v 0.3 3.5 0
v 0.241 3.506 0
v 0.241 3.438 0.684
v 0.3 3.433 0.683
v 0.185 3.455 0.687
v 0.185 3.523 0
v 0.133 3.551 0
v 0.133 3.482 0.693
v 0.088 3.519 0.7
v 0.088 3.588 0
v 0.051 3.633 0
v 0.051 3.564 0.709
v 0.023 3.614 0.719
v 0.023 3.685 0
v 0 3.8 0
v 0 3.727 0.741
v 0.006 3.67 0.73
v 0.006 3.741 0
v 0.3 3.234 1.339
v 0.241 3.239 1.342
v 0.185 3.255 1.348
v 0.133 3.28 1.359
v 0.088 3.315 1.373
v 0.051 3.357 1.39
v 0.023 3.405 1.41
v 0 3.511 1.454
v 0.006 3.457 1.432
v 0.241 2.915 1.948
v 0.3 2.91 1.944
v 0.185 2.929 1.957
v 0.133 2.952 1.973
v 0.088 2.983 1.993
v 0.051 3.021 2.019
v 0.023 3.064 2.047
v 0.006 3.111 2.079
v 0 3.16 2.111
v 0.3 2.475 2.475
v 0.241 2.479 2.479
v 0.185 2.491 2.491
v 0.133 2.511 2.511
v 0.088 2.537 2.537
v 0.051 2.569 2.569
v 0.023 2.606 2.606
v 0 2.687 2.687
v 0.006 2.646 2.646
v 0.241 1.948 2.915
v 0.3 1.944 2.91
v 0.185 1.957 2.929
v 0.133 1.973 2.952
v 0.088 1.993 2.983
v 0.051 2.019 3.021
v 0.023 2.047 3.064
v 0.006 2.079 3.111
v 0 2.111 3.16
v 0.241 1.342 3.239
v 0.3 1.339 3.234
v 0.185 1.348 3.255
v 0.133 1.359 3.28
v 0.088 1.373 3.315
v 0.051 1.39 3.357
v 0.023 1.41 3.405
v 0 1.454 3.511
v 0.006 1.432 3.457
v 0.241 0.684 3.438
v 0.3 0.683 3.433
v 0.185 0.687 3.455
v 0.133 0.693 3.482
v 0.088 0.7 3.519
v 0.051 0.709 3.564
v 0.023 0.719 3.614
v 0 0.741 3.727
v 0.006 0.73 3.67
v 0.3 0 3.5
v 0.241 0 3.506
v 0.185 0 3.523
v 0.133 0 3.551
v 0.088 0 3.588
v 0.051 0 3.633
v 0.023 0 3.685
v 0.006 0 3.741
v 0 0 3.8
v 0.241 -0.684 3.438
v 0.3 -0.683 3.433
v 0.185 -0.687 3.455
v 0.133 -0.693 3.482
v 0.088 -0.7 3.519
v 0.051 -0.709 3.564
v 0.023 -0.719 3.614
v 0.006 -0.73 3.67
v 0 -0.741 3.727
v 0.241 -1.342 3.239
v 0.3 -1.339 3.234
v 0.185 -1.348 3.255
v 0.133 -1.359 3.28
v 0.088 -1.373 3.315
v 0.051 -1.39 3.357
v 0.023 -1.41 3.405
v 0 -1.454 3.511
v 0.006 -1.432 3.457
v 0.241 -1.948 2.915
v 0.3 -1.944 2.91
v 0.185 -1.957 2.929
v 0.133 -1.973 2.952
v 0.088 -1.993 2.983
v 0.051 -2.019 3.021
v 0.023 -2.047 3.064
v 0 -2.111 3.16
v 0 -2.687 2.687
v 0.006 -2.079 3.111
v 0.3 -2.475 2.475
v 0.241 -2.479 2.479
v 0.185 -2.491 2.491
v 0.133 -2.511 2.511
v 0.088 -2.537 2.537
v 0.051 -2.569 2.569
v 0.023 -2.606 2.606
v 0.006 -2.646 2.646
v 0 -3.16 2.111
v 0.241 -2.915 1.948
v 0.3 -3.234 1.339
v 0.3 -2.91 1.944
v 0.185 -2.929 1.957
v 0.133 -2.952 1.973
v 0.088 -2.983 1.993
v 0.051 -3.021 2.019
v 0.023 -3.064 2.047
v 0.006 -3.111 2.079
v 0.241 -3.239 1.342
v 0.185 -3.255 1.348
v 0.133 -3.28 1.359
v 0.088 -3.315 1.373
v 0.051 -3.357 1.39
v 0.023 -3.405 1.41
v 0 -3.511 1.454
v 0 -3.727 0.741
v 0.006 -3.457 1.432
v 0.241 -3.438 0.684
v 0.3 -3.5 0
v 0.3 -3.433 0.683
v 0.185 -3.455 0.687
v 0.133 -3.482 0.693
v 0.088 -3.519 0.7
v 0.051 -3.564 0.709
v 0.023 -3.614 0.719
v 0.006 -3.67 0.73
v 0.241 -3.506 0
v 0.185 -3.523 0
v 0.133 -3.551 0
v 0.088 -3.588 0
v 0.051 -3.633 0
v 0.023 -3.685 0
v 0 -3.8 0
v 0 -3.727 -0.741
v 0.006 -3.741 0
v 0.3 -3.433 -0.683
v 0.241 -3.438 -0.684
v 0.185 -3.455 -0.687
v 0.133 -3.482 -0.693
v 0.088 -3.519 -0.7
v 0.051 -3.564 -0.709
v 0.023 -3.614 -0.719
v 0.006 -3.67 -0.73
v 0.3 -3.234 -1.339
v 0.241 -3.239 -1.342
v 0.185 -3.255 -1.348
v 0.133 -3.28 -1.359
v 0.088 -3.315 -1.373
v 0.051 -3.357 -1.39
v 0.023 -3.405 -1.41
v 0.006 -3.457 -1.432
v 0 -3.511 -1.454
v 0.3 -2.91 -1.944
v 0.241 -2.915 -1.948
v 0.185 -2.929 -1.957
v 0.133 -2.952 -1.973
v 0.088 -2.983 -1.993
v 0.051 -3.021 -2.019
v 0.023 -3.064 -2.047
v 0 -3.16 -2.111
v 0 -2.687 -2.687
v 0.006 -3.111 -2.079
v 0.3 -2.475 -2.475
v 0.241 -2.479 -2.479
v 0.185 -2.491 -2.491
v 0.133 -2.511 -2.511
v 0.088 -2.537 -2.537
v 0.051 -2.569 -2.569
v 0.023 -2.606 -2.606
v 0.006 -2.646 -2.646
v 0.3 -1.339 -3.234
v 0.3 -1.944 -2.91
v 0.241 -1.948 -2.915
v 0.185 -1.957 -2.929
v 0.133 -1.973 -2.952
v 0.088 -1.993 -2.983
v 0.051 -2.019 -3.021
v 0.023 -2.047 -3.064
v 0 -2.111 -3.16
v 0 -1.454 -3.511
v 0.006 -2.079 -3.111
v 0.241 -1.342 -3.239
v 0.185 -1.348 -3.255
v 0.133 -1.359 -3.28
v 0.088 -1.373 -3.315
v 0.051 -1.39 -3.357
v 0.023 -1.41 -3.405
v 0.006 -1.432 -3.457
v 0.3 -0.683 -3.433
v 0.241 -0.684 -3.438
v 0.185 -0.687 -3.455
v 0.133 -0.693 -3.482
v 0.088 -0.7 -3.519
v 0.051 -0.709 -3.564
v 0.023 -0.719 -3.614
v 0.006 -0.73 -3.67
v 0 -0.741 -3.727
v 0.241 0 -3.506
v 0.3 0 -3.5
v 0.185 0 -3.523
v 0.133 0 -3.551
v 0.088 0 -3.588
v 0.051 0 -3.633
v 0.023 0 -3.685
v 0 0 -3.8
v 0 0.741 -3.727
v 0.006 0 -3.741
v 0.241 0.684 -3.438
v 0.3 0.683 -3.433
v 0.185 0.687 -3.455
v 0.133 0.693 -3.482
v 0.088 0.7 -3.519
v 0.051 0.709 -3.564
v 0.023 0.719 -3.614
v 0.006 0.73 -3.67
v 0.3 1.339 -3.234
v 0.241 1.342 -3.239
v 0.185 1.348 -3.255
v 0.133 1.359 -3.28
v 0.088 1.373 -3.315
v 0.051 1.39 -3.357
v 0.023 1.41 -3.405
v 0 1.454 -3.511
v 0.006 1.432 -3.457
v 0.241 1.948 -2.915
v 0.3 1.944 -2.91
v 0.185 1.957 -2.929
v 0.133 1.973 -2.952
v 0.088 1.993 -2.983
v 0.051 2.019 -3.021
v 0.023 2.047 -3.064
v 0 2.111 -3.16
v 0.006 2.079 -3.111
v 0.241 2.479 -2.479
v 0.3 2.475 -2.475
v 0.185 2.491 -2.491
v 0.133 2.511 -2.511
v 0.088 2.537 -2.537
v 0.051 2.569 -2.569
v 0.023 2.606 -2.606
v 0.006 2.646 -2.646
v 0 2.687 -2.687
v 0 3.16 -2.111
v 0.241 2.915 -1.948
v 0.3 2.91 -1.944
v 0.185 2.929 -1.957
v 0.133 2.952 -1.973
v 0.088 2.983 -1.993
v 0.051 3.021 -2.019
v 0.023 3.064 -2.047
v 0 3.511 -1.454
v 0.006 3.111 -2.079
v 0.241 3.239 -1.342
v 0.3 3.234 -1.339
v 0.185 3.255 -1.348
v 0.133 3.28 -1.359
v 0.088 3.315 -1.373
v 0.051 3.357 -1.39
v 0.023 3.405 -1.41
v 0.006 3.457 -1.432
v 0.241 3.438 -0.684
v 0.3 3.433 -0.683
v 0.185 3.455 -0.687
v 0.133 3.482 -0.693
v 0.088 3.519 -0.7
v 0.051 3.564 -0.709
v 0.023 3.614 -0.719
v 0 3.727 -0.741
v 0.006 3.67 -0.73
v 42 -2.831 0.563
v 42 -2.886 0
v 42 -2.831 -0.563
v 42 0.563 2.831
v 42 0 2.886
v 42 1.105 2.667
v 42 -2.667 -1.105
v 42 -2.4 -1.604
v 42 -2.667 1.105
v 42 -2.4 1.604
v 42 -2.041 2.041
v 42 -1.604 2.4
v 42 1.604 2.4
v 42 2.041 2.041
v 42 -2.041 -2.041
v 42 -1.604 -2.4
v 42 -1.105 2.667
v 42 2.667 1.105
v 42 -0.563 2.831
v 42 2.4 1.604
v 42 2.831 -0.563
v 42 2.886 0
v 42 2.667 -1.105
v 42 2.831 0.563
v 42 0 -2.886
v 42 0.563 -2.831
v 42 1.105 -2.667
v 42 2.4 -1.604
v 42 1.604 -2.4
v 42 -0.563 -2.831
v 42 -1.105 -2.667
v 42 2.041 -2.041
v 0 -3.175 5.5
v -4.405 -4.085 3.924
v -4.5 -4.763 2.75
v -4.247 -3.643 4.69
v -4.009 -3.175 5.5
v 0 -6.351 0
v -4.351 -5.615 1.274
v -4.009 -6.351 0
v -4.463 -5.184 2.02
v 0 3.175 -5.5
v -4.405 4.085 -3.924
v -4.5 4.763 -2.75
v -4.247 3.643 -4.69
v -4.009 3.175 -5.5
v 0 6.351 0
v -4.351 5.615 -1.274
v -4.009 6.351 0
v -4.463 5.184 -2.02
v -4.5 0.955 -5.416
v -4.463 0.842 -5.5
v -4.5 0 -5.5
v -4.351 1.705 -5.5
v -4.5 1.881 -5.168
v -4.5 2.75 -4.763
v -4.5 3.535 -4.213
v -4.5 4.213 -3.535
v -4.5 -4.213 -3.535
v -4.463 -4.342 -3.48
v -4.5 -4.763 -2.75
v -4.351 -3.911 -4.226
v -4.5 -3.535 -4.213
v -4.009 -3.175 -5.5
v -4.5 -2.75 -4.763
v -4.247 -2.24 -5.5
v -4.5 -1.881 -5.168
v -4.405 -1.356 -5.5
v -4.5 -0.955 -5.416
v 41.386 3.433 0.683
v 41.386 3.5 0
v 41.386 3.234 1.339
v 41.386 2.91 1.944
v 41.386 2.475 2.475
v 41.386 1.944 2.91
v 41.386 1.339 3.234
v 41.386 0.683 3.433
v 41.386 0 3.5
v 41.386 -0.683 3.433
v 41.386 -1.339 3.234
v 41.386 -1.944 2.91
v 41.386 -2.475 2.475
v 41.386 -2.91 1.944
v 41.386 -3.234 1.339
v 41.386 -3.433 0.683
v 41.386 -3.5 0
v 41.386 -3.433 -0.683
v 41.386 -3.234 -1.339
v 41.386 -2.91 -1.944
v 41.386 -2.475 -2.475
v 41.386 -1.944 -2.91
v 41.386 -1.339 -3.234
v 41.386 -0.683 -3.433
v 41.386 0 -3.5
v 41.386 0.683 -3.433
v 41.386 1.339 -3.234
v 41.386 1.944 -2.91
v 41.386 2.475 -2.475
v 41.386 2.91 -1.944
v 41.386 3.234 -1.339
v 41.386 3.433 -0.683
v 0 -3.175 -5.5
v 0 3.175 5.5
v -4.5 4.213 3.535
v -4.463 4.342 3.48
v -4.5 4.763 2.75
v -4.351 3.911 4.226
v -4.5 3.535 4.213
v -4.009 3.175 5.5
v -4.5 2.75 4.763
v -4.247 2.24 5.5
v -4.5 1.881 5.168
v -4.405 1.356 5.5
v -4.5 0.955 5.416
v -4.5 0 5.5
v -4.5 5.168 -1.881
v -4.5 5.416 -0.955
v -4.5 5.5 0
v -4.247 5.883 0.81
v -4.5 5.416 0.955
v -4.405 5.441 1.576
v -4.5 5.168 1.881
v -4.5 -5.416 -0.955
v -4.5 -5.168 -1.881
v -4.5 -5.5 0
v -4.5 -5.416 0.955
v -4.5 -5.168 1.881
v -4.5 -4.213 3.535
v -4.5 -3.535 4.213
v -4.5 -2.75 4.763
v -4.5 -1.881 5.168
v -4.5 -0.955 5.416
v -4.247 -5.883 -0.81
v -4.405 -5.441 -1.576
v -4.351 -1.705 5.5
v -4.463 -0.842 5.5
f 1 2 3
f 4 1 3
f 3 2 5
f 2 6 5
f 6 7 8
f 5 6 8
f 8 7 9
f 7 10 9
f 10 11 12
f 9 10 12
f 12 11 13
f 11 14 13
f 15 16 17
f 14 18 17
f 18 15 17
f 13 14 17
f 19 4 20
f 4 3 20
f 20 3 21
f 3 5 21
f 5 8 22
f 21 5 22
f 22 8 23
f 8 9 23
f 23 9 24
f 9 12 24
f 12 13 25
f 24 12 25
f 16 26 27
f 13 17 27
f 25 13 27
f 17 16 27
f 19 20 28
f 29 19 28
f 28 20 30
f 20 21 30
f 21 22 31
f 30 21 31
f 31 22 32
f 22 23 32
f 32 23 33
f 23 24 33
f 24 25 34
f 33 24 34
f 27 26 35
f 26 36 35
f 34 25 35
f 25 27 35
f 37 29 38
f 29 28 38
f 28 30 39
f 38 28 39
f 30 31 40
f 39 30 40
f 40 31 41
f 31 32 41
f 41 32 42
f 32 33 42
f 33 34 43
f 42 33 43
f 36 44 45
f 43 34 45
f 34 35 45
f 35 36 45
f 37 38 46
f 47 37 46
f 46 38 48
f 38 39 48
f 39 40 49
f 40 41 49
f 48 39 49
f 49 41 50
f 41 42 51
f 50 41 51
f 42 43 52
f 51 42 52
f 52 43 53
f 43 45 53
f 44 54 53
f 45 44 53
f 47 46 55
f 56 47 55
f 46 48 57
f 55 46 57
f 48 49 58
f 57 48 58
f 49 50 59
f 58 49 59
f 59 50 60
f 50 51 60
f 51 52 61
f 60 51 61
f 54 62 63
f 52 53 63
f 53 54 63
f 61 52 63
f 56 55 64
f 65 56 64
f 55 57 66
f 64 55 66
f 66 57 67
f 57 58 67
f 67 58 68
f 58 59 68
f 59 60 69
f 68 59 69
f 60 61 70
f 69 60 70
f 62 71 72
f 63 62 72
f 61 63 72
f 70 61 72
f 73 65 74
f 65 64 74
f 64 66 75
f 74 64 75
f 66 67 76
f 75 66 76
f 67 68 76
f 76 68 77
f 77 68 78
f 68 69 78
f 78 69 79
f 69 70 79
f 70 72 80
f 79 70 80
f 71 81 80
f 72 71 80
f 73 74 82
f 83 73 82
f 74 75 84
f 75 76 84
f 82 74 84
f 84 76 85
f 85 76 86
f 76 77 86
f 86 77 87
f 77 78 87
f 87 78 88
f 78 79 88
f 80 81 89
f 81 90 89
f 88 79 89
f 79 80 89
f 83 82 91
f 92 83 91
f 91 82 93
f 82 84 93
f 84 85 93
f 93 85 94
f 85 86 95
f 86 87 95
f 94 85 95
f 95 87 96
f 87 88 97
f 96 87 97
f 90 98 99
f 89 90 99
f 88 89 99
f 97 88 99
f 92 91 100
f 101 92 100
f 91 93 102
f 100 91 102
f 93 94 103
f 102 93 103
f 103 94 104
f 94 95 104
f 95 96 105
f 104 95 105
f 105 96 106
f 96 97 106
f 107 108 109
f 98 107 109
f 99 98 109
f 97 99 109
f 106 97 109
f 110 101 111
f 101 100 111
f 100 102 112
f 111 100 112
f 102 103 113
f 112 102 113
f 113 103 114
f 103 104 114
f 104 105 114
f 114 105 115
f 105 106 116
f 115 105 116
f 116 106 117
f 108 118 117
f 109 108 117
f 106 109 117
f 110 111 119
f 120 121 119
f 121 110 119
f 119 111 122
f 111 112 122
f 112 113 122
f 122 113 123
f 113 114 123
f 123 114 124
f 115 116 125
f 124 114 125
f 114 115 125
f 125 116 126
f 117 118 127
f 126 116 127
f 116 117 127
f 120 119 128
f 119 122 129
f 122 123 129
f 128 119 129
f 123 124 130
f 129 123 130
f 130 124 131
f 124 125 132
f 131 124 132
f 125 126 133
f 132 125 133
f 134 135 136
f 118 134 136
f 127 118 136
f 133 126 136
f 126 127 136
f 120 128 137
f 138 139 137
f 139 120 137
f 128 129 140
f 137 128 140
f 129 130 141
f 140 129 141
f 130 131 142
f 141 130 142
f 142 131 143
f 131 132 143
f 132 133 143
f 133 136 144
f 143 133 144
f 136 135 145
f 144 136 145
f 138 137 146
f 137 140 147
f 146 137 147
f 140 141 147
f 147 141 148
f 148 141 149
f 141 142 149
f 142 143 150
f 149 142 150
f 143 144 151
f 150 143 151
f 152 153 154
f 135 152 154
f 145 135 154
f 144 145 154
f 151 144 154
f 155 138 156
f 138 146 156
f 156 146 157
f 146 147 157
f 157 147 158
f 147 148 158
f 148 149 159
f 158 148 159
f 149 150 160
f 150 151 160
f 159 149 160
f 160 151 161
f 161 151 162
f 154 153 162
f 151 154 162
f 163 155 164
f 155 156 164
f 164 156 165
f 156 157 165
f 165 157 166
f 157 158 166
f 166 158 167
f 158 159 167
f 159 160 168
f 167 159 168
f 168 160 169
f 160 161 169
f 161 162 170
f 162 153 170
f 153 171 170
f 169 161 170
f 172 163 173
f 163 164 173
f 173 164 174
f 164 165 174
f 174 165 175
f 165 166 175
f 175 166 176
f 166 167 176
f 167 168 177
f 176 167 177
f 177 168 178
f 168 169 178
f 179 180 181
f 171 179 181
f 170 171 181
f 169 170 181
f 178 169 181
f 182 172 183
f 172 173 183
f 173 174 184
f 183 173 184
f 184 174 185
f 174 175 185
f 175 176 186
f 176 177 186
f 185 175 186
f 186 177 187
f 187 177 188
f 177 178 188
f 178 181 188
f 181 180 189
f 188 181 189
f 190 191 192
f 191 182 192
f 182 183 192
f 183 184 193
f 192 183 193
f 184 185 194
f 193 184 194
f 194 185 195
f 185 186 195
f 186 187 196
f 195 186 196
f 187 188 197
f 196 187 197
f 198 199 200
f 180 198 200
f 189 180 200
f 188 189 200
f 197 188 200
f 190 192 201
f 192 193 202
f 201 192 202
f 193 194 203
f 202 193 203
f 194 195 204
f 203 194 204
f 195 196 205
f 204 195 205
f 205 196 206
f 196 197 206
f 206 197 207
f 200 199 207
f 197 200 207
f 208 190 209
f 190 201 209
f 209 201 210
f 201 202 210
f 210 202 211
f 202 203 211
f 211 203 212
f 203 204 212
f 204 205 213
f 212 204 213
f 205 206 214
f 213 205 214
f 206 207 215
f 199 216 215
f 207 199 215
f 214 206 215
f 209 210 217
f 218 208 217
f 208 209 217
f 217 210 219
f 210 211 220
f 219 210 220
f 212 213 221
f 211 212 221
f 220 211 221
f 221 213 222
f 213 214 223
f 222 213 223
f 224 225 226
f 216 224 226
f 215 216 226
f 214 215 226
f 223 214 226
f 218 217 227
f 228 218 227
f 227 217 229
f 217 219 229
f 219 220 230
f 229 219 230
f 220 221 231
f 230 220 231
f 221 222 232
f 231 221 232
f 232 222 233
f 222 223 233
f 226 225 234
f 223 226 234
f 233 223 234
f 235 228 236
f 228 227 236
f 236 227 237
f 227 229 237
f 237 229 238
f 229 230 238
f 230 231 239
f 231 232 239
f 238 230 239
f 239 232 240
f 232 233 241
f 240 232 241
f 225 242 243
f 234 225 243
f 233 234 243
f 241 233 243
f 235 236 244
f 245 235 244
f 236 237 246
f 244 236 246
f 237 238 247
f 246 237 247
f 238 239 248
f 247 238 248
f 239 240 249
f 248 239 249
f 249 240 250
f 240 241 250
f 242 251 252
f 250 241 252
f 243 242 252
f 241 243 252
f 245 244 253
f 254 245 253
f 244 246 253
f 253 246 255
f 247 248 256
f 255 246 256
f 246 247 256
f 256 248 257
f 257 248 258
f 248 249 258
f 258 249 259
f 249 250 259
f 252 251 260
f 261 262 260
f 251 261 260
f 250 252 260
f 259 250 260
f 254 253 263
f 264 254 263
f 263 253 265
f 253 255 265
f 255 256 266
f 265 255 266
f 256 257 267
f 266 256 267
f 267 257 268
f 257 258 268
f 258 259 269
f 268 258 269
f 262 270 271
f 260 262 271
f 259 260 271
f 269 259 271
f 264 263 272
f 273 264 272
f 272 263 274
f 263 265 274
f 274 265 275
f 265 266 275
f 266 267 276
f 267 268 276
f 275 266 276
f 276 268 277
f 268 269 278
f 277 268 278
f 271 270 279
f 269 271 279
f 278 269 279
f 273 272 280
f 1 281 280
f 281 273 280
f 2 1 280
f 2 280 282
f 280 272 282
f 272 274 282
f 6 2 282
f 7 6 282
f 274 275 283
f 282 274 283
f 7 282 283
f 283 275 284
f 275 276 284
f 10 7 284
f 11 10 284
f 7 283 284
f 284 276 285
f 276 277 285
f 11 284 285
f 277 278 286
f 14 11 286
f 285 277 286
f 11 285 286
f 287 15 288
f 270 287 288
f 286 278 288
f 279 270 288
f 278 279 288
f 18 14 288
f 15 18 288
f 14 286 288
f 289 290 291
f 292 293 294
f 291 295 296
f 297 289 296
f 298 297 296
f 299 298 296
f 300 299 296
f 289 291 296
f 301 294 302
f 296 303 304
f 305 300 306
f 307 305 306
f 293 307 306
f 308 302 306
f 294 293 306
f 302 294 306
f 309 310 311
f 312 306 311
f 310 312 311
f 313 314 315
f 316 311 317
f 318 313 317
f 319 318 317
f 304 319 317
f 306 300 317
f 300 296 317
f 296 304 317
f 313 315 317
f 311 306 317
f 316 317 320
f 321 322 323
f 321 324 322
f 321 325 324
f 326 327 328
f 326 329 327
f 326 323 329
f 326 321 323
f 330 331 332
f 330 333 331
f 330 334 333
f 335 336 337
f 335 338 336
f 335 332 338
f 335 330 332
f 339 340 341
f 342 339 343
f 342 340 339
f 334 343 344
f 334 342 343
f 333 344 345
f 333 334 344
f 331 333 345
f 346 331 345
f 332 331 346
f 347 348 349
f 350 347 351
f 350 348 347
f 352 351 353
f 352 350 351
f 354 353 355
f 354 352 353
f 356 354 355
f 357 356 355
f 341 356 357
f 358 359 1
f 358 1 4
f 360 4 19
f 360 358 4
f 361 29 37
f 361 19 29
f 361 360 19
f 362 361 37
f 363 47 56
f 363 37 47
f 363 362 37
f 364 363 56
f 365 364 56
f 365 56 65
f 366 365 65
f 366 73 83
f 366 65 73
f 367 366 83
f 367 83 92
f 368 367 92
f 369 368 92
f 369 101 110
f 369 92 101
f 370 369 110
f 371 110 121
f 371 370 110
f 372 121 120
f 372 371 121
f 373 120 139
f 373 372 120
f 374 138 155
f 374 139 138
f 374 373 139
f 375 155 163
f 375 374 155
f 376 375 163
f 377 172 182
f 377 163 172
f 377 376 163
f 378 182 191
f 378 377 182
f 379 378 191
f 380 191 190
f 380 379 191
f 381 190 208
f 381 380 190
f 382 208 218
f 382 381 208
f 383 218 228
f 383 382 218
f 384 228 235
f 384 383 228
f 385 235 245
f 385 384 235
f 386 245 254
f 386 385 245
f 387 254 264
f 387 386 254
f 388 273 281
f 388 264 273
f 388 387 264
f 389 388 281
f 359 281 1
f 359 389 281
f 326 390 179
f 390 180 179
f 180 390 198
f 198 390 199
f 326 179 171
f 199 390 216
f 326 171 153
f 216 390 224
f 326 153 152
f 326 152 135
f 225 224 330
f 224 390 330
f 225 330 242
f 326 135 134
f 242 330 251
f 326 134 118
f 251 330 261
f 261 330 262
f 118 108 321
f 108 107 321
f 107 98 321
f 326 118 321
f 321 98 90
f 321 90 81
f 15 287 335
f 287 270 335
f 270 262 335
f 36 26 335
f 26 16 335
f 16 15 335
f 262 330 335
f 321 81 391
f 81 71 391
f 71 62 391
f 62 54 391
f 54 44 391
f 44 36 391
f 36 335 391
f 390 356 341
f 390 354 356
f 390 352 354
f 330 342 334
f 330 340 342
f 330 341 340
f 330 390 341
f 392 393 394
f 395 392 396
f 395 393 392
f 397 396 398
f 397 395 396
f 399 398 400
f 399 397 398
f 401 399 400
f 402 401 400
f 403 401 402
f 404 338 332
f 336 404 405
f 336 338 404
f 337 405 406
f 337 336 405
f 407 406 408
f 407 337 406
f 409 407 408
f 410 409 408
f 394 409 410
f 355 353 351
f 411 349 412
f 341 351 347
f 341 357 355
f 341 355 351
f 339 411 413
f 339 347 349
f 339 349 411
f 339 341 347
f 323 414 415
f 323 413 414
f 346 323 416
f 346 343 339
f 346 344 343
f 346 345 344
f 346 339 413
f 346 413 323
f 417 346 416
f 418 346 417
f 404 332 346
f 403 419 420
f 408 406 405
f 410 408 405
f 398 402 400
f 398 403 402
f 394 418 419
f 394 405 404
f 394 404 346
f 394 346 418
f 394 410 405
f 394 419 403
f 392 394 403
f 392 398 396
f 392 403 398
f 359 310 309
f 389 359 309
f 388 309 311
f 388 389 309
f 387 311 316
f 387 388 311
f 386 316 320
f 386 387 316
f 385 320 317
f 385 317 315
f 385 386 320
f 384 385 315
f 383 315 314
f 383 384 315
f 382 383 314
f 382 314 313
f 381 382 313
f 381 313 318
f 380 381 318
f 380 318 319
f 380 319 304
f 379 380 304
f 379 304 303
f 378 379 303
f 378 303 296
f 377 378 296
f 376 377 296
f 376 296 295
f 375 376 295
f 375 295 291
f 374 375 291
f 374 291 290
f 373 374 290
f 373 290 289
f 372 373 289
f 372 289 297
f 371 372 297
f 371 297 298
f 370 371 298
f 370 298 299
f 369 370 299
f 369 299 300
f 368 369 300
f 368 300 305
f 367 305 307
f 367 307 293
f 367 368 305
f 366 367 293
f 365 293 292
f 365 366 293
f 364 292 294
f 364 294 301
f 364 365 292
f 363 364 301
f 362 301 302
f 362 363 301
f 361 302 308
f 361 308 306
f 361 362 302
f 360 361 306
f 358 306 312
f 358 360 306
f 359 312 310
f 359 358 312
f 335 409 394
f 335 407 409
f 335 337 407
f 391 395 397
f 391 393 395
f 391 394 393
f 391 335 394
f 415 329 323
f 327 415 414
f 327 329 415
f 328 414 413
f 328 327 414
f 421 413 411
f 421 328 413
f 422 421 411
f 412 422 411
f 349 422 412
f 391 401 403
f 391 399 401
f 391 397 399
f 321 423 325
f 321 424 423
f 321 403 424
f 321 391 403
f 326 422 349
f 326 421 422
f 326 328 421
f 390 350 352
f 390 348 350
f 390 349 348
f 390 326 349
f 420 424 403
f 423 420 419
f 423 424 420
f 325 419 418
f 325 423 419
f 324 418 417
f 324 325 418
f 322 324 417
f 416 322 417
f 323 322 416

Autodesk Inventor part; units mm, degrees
ref_plane "YZ Plane" through (0, 0, 0) normal (1, 0, 0) x (0, 1, 0)
ref_plane "XZ Plane" through (0, 0, 0) normal (0, 1, 0) x (-1, 0, 0)
sketch "Sketch1" plane through (0, 0, 0) normal (0, 0, 1) x (1, 0, 0)
  line L0 (0, 3.5) -> (42, 3.5)
  line L1 (42, 3.5) -> (42, 0)
  line L2 (42, 0) -> (0, 0)
  line L3 (-8.4, 0) -> (50.4, 0) projected
  line L4 (0, -0.7) -> (0, 4.2) projected
  line L5 (0, 3.5) -> (0, 0)
  dimension "d2" = 7
  dimension "d59" = 42
revolve "Body" add sketch "Sketch1" angle 360 about axis through (42, 0, 0) along (-1, 0, 0)
sketch "Sketch2" plane through (0, 0, 0) normal (-1, 0, 0) x (0, 0, 1)
  line L0 (0, 6.3509) -> (5.5, 3.1754)
  line L1 (5.5, 3.1754) -> (5.5, -3.1754)
  line L2 (5.5, -3.1754) -> (0, -6.3509)
  line L3 (0, -6.3509) -> (-5.5, -3.1754)
  line L4 (-5.5, -3.1754) -> (-5.5, 3.1754)
  line L5 (-5.5, 3.1754) -> (0, 6.3509)
  line L6 (-7.7, 0) -> (7.7, 0) projected
  line L7 (0, 8.8912) -> (0, -8.8912) projected
  point P0 (0, 0)
  point P1 (0, 0)
  dimension "d11" = 11
extrude "Head" add sketch "Sketch2" along normal blind 4.5
sketch "Sketch4" plane through (0, 0, 0) normal (0, 0, 1) x (1, 0, 0)
  line L0 (-3.8649, 6.6) -> (-4.5, 5.5)
  line L1 (-1.1, 0) -> (-0.234, 0)
  line L2 (-5.3532, 0) -> (0.6192, 0) projected
  line L3 (-4.5, 6.6) -> (-3.8649, 6.6)
  line L4 (-4.5, 5.5) -> (-4.5, 6.6)
  line L5 (0, 7.92) -> (0, -1.32) projected
  dimension "d65" = 11
  dimension "d67" = 30
  dimension "d68" = 13.2
  dimension "d69" = 4.5
revolve "Chamfer1" cut sketch "Sketch4" angle 360 about axis through (-1.1, 0, 0) along (1, 0, 0)
thread "Thread" size "M7x1" class "6g" standard "ISO Metric profile" length 13
chamfer "Chamfer2" distance 0.6135 distance2 0.6136 1 edges at (42, -3.5, 0) measured on face at (42, -1.0838, 0.9601)
fillet "Fillet2" radius 0.3 1 edges at (0, -3.5, 0)
ref_plane "Work Plane1" through (1.525, 0, 0) normal (0, 0, 1) x (1, 0, 0)
equation "\"d2\" = GD"
equation "\"d59\" = NLG"
equation "\"d11\" = SW"
equation "\"d3\" = KOH"
equation "\"d71\" = RR"
equation "\"d15\" = GEL"
equation "\"d6\" = -0.5 * SPD + 0.5 * GD"
equation "\"d65\" = SW"
equation "\"d67\" = ANG1"
equation "\"d68\" = 1.2 * SW"
equation "\"d69\" = KOH"
equation "\"NLG\" = 42"
equation "\"GD\" = NND"
equation "\"BDM\" = NND"
equation "\"KOH\" = 4.5"
equation "\"GEL\" = 13"
equation "\"SW\" = 11"
equation "\"SW0\" = 11"
equation "\"SPD\" = NND - 1.2269 * PTC"
equation "\"SD2\" = NND"
equation "\"SD\" = 0"
equation "\"ANG1\" = 30deg"
equation "\"GAL\" = 0.61345 * PTC"
equation "\"GUL\" = 0.61345 * PTC"
equation "\"RR\" = 0.3"
equation "\"RR1\" = 0.1"
equation "\"GD1\" = THREADDIA - 1.2269 * PTC"
equation "\"THREADDIA\" = 7"
equation "\"TOA\" = 30deg"
equation "\"FAWI\" = 60deg"
equation "\"PTC\" = 1"
equation "\"NND\" = 7"
equation "\"E0\" = 1.155 * SW"
properties part number "CSN 02 1201 - M7 x 42" material "Steel, Mild"
